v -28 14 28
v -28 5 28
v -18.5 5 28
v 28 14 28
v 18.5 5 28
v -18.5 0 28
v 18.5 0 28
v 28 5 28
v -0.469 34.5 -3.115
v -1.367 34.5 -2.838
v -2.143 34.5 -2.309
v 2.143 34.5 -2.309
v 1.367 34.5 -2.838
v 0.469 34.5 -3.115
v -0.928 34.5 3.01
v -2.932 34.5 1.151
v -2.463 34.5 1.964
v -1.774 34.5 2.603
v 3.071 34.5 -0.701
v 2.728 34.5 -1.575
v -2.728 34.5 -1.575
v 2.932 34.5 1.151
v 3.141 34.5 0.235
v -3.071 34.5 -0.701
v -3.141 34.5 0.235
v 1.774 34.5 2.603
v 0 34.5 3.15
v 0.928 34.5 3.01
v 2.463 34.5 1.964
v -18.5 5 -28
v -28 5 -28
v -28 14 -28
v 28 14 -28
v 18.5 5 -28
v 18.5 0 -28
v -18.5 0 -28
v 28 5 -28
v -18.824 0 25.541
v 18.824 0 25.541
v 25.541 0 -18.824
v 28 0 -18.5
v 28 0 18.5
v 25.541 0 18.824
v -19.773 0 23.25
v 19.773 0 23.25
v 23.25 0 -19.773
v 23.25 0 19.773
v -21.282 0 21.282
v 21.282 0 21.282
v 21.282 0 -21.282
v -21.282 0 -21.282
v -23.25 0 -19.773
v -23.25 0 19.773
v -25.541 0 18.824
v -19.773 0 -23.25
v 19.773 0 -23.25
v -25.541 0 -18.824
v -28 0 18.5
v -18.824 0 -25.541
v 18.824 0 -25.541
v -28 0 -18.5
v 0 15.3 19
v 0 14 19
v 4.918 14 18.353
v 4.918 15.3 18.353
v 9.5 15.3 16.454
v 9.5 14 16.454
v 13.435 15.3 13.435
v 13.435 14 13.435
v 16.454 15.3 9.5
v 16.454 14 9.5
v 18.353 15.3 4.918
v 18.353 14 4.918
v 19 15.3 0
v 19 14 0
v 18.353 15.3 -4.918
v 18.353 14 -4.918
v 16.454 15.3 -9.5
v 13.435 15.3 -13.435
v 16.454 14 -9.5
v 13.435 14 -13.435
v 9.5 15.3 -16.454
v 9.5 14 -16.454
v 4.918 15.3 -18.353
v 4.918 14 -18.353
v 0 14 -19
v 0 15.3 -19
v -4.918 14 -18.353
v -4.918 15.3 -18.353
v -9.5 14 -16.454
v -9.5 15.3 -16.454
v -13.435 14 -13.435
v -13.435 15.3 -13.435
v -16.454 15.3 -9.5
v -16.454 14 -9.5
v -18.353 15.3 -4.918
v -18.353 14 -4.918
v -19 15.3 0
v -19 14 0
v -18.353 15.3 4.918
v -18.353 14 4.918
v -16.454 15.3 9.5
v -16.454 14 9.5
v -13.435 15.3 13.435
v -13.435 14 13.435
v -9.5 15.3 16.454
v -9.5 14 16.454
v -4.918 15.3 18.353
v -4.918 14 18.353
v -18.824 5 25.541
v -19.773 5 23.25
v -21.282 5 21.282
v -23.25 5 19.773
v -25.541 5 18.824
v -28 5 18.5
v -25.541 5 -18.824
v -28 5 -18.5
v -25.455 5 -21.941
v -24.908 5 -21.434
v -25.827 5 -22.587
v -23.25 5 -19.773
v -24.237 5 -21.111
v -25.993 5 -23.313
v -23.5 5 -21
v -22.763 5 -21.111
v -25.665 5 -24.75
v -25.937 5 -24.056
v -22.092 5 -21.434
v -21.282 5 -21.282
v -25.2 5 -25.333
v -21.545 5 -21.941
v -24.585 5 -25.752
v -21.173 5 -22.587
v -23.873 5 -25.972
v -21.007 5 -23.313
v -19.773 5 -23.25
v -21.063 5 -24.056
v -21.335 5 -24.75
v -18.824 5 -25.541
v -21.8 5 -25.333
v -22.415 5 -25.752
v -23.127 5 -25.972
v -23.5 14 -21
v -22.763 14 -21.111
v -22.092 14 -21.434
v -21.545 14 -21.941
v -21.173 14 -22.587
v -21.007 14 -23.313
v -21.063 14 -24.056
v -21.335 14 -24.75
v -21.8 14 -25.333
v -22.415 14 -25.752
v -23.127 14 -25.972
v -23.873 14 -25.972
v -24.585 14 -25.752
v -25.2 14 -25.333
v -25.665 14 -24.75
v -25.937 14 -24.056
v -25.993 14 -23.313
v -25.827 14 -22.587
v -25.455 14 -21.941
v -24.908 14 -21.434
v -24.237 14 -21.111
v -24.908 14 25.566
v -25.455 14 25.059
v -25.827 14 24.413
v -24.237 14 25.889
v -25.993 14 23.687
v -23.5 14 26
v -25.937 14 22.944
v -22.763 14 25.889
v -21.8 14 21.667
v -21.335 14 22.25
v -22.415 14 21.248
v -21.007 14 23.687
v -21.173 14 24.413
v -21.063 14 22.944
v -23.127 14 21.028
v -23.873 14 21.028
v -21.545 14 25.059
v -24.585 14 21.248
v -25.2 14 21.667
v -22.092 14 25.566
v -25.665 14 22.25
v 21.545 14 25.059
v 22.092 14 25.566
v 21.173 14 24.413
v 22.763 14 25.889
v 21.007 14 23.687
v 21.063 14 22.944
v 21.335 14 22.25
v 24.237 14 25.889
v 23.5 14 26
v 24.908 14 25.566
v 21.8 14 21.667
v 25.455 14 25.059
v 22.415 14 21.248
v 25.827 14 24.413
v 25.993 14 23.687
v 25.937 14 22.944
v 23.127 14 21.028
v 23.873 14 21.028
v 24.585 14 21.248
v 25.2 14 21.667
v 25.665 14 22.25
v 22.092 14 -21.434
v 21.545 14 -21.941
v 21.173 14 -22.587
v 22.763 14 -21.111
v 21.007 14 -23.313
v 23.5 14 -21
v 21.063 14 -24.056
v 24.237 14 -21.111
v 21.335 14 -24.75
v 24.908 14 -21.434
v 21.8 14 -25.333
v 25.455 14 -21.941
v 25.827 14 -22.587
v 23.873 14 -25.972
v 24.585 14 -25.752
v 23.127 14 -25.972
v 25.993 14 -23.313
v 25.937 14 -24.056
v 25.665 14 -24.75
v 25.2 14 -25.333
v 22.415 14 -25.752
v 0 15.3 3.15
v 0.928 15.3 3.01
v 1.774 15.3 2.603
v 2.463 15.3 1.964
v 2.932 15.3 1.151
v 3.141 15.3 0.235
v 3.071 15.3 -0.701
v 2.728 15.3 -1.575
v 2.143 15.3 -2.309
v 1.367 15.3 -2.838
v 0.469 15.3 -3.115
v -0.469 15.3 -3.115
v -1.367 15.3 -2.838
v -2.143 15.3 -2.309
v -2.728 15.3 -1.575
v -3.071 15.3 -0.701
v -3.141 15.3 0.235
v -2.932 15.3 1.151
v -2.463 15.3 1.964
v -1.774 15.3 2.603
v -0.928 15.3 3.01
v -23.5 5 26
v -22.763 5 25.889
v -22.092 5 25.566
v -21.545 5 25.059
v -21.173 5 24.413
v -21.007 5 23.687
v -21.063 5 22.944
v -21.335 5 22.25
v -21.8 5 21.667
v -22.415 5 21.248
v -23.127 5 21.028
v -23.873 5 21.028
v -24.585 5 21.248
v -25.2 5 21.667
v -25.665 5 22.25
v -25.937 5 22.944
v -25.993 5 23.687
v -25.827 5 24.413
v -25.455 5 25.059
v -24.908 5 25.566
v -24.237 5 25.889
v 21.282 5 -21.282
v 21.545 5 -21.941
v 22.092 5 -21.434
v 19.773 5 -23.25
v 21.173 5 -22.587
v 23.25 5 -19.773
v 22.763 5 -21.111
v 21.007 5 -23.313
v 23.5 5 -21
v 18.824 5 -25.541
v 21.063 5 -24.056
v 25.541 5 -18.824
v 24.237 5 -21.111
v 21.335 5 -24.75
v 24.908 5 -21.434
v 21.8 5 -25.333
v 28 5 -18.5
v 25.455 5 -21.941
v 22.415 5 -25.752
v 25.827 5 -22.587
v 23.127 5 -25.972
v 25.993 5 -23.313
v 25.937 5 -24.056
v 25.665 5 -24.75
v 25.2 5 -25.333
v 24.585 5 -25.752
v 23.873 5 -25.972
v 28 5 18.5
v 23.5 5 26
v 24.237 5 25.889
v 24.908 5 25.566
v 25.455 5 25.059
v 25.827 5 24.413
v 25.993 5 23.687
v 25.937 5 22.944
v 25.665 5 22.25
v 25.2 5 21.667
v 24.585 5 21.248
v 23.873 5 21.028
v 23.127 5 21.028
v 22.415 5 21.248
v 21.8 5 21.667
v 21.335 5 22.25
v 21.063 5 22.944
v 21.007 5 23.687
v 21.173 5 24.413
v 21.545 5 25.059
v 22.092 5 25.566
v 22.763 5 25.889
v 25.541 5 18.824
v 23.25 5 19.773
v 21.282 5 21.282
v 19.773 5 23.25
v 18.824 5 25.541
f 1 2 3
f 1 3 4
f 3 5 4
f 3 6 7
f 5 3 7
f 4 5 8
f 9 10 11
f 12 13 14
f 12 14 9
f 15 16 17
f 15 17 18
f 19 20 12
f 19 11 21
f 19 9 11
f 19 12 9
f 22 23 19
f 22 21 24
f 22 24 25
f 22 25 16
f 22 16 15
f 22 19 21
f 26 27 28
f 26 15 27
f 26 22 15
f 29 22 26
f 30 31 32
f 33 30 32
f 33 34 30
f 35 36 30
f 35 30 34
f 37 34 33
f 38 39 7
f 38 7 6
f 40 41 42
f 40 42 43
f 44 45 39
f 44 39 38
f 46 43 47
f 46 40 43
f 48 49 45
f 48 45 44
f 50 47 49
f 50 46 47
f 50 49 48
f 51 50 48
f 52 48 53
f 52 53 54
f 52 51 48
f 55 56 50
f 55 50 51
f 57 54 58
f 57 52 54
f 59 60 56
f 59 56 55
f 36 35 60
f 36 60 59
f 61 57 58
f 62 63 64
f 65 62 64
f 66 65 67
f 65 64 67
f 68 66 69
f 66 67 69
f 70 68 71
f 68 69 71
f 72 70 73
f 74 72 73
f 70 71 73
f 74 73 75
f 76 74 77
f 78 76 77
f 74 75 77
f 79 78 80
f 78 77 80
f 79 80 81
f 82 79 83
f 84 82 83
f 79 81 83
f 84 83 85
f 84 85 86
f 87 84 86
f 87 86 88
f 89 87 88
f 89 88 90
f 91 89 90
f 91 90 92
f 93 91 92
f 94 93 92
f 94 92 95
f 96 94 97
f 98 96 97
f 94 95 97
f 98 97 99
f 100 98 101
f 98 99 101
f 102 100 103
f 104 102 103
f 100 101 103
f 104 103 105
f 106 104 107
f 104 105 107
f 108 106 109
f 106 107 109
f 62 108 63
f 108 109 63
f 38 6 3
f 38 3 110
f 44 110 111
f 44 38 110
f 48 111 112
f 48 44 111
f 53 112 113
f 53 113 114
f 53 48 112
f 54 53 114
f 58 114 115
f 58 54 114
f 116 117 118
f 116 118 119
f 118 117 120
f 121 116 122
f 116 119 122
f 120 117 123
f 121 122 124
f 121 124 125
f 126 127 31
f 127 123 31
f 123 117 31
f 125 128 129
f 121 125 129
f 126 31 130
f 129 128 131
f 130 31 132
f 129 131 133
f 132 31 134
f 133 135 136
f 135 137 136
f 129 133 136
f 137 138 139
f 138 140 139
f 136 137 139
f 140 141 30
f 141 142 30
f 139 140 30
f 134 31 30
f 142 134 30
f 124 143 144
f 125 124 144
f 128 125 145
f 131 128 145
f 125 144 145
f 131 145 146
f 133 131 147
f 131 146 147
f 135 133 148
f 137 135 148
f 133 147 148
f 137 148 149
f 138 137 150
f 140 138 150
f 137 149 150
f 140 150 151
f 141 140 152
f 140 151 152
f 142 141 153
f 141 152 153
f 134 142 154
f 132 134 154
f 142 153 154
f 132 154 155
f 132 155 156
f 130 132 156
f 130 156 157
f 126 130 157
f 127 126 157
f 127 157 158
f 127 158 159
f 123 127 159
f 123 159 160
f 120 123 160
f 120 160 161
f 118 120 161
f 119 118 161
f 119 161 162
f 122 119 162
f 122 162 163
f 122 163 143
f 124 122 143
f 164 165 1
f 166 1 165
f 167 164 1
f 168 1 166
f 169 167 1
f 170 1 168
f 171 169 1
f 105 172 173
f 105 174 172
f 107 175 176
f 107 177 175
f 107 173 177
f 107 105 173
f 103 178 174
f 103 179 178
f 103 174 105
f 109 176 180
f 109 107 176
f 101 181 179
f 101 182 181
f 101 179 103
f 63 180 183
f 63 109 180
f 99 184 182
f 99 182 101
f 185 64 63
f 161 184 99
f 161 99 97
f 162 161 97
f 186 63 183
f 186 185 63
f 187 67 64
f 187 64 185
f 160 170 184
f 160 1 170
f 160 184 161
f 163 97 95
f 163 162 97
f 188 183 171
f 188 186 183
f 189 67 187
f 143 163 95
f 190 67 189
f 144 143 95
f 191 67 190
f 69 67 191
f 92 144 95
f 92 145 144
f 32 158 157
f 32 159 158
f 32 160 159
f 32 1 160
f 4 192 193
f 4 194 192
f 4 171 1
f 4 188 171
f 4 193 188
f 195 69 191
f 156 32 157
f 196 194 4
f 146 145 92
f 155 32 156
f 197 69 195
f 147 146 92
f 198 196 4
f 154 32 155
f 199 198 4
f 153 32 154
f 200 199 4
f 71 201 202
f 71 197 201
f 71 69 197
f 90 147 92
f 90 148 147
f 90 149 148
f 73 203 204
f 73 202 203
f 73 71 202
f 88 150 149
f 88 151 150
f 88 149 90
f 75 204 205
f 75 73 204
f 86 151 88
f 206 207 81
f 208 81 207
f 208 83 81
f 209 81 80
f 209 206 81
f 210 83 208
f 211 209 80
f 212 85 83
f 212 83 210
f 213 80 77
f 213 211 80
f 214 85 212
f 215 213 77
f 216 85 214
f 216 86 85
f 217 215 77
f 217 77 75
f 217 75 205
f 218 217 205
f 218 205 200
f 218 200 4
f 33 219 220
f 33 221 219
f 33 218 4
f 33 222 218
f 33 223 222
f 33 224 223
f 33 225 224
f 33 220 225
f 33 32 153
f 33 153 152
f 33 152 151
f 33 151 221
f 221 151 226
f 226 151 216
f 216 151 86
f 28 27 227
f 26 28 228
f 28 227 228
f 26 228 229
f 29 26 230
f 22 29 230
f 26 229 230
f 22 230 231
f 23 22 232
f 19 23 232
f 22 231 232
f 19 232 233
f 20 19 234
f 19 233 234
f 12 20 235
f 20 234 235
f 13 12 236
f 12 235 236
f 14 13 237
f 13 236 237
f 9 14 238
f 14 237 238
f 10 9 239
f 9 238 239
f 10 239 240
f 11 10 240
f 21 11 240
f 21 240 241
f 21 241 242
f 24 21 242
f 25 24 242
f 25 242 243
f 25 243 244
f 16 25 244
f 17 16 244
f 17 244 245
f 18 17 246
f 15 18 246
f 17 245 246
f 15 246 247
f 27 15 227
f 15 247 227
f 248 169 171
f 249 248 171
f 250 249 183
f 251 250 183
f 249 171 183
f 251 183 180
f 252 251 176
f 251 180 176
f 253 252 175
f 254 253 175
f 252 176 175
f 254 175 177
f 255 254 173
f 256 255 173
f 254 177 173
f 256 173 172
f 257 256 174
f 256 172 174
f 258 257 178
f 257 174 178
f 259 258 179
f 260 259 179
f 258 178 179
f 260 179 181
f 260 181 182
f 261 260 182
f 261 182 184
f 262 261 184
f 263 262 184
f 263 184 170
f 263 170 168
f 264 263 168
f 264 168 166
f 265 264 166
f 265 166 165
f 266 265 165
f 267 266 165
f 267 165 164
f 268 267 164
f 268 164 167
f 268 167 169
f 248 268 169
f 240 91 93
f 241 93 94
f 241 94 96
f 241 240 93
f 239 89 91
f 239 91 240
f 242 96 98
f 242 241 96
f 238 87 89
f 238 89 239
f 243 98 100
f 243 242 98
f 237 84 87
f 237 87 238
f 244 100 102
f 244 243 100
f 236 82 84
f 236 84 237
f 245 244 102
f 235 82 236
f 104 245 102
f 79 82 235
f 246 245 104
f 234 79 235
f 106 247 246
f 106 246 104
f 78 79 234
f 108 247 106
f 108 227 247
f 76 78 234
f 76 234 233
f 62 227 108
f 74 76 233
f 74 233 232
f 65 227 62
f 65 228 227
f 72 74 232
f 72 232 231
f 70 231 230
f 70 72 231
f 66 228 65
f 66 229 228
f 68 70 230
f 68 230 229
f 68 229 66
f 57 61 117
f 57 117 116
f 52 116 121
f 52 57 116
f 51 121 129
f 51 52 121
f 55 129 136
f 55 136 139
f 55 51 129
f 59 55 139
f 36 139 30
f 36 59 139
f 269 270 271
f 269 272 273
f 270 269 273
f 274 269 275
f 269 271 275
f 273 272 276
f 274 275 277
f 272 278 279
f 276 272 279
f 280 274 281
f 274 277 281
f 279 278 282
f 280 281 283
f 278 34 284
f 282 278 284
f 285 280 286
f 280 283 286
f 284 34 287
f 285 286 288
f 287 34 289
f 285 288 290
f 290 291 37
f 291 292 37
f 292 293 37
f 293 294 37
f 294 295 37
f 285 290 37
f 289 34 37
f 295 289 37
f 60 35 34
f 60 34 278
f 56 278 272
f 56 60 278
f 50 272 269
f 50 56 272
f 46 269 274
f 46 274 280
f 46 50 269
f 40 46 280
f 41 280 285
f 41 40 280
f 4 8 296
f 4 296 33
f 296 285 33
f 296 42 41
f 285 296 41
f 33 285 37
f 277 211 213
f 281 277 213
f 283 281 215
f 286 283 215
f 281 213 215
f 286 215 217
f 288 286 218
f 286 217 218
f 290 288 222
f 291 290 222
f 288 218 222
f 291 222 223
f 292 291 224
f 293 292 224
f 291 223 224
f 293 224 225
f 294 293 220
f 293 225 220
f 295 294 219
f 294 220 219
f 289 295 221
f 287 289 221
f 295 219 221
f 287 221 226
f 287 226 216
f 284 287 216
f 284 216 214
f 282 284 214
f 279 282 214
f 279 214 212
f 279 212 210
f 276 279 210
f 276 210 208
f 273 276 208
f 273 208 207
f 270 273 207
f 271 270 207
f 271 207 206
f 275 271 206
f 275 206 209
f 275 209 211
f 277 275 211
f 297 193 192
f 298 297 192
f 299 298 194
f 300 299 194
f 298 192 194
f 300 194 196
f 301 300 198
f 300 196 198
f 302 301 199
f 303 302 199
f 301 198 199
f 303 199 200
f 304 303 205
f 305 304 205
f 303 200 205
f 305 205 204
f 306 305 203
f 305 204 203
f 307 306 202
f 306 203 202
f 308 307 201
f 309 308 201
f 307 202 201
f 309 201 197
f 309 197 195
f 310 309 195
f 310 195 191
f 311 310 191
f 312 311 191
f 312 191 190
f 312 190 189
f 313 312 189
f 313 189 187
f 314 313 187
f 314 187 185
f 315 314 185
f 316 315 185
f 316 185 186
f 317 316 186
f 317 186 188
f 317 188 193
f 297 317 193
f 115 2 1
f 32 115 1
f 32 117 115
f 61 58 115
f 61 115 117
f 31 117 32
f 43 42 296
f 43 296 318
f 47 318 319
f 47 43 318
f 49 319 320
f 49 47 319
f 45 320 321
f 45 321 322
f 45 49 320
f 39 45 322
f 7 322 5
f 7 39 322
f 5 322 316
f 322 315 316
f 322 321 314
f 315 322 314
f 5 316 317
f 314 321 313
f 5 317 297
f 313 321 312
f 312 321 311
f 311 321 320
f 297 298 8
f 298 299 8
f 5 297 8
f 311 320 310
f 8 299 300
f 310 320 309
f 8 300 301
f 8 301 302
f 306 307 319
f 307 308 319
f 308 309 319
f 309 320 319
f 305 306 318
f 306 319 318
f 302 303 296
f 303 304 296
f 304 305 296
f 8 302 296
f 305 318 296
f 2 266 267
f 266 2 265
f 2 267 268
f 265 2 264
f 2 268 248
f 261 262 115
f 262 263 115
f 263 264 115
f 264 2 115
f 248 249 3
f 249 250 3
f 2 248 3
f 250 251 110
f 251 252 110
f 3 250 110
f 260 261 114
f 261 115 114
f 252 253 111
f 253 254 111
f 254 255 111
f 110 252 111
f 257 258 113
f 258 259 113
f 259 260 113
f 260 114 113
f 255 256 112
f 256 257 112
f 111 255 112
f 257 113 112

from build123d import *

# Parameters (mm, degrees)
BOSS_EXTRUDE5_DEPTH = 5
SKETCH6_W           = 56
SKETCH6_H           = 56
BOSS_EXTRUDE6_DEPTH = 9
SKETCH7_R           = 19
BOSS_EXTRUDE7_DEPTH = 1.3
SKETCH8_R           = 2.5
CUT_EXTRUDE1_DEPTH  = 43
SKETCH9_R           = 3.15
BOSS_EXTRUDE8_DEPTH = 19.2


with BuildPart() as part:
    # Sketch1 → Boss-Extrude5 (new body)
    with BuildSketch(Plane(origin=(0, 0, 0), x_dir=(1, 0, 0), z_dir=(0, 1, 0))):
        with BuildLine():
            Line((-18.5, 28), (18.5, 28))
            ThreePointArc((18.5, 28), (21.282485579, 21.282485579), (28, 18.5))
            Line((28, 18.5), (28, -18.5))
            ThreePointArc((28, -18.5), (21.282485579, -21.282485579), (18.5, -28))
            Line((18.5, -28), (-18.5, -28))
            ThreePointArc((-18.5, -28), (-21.282485579, -21.282485579), (-28, -18.5))
            Line((-28, -18.5), (-28, 18.5))
            ThreePointArc((-28, 18.5), (-21.282485579, 21.282485579), (-18.5, 28))
        make_face()
    extrude(amount=BOSS_EXTRUDE5_DEPTH)

    # Sketch6 → Boss-Extrude6 (add)
    with BuildSketch(Plane(origin=(0, 5, 0), x_dir=(1, 0, 0), z_dir=(0, 1, 0))):
        Rectangle(SKETCH6_W, SKETCH6_H)
    extrude(amount=BOSS_EXTRUDE6_DEPTH)

    # Sketch7 → Boss-Extrude7 (add)
    with BuildSketch(Plane(origin=(0, 14, 0), x_dir=(1, 0, 0), z_dir=(0, 1, 0))):
        with Locations(Location((0, 0, 0), (0, 0, 270))):
            Circle(SKETCH7_R)
    extrude(amount=BOSS_EXTRUDE7_DEPTH)

    # Sketch8 → Cut-Extrude1 (cut, through all)
    with BuildSketch(Plane(origin=(0, 14, 0), x_dir=(1, 0, 0), z_dir=(0, 1, 0))):
        with Locations(Location((-23.5, 23.5, 0), (0, 0, 270))):
            Circle(SKETCH8_R)
        with Locations(Location((23.5, 23.5, 0), (0, 0, 270))):
            Circle(SKETCH8_R)
        with Locations(Location((23.5, -23.5, 0), (0, 0, 270))):
            Circle(SKETCH8_R)
        with Locations(Location((-23.5, -23.5, 0), (0, 0, 270))):
            Circle(SKETCH8_R)
    extrude(amount=-CUT_EXTRUDE1_DEPTH, mode=Mode.SUBTRACT)

    # Sketch9 → Boss-Extrude8 (add)
    with BuildSketch(Plane(origin=(0, 15.3, 0), x_dir=(1, 0, 0), z_dir=(0, 1, 0))):
        with Locations(Location((0, 0, 0), (0, 0, 270))):
            Circle(SKETCH9_R)
    extrude(amount=BOSS_EXTRUDE8_DEPTH)


solid = part.part
